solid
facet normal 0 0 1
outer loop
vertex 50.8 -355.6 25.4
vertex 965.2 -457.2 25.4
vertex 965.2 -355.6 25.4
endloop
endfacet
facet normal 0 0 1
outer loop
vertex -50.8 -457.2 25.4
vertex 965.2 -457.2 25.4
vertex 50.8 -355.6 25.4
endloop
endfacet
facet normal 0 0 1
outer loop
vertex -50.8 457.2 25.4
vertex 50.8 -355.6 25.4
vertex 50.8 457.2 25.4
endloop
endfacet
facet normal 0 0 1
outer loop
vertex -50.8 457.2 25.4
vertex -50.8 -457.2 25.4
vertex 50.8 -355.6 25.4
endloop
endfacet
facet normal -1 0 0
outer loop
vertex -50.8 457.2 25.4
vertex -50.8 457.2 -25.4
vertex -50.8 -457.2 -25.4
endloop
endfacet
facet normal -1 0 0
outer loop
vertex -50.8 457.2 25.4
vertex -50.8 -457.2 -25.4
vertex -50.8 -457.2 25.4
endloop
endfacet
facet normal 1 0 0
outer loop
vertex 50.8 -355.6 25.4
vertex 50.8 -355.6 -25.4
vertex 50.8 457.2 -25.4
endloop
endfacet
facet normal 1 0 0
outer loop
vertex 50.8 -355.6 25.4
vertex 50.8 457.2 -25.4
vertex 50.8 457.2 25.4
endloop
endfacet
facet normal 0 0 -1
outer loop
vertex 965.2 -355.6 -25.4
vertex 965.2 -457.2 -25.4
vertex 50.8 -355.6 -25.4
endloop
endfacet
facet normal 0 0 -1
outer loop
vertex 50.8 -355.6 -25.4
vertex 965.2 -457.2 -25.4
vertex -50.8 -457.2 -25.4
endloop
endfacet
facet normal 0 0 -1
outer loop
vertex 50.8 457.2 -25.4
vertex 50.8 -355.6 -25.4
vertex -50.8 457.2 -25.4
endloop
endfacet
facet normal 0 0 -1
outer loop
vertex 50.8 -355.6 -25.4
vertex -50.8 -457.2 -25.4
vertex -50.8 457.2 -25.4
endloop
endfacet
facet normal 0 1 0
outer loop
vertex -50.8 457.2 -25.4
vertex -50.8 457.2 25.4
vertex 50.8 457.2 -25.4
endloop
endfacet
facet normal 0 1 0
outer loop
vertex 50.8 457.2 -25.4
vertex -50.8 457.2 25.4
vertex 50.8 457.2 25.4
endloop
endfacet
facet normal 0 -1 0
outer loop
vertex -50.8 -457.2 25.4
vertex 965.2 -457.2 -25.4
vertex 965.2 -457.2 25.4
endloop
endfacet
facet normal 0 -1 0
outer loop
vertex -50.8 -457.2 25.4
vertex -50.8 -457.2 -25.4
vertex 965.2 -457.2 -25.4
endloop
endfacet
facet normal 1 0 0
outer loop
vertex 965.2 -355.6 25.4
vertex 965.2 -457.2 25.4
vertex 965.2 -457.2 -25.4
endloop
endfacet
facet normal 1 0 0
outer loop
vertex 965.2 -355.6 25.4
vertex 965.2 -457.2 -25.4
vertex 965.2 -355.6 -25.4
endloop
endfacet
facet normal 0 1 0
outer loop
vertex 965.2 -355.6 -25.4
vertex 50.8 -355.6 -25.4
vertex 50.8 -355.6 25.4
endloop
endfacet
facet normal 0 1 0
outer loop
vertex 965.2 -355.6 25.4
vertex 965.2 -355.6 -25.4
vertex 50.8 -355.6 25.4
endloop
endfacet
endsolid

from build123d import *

# Parameters (mm, degrees)
F0_W     = 101.6
F0_H     = 50.8
F1_DEPTH = 457.2
F2_W     = 101.6
F2_H     = 50.8
F3_DEPTH = 914.4


with BuildPart() as f1:
    # F0 (on Front) → F1 (new body, symmetric)
    with BuildSketch(Plane.XZ):
        Rectangle(F0_W, F0_H)
    extrude(amount=F1_DEPTH, both=True)

    # F2 (on face) → F3 (join)
    with BuildSketch(Plane.YZ.offset(50.8)):
        with Locations((-406.4, 0)):
            Rectangle(F2_W, F2_H)
    extrude(amount=F3_DEPTH)


solid = f1.part
